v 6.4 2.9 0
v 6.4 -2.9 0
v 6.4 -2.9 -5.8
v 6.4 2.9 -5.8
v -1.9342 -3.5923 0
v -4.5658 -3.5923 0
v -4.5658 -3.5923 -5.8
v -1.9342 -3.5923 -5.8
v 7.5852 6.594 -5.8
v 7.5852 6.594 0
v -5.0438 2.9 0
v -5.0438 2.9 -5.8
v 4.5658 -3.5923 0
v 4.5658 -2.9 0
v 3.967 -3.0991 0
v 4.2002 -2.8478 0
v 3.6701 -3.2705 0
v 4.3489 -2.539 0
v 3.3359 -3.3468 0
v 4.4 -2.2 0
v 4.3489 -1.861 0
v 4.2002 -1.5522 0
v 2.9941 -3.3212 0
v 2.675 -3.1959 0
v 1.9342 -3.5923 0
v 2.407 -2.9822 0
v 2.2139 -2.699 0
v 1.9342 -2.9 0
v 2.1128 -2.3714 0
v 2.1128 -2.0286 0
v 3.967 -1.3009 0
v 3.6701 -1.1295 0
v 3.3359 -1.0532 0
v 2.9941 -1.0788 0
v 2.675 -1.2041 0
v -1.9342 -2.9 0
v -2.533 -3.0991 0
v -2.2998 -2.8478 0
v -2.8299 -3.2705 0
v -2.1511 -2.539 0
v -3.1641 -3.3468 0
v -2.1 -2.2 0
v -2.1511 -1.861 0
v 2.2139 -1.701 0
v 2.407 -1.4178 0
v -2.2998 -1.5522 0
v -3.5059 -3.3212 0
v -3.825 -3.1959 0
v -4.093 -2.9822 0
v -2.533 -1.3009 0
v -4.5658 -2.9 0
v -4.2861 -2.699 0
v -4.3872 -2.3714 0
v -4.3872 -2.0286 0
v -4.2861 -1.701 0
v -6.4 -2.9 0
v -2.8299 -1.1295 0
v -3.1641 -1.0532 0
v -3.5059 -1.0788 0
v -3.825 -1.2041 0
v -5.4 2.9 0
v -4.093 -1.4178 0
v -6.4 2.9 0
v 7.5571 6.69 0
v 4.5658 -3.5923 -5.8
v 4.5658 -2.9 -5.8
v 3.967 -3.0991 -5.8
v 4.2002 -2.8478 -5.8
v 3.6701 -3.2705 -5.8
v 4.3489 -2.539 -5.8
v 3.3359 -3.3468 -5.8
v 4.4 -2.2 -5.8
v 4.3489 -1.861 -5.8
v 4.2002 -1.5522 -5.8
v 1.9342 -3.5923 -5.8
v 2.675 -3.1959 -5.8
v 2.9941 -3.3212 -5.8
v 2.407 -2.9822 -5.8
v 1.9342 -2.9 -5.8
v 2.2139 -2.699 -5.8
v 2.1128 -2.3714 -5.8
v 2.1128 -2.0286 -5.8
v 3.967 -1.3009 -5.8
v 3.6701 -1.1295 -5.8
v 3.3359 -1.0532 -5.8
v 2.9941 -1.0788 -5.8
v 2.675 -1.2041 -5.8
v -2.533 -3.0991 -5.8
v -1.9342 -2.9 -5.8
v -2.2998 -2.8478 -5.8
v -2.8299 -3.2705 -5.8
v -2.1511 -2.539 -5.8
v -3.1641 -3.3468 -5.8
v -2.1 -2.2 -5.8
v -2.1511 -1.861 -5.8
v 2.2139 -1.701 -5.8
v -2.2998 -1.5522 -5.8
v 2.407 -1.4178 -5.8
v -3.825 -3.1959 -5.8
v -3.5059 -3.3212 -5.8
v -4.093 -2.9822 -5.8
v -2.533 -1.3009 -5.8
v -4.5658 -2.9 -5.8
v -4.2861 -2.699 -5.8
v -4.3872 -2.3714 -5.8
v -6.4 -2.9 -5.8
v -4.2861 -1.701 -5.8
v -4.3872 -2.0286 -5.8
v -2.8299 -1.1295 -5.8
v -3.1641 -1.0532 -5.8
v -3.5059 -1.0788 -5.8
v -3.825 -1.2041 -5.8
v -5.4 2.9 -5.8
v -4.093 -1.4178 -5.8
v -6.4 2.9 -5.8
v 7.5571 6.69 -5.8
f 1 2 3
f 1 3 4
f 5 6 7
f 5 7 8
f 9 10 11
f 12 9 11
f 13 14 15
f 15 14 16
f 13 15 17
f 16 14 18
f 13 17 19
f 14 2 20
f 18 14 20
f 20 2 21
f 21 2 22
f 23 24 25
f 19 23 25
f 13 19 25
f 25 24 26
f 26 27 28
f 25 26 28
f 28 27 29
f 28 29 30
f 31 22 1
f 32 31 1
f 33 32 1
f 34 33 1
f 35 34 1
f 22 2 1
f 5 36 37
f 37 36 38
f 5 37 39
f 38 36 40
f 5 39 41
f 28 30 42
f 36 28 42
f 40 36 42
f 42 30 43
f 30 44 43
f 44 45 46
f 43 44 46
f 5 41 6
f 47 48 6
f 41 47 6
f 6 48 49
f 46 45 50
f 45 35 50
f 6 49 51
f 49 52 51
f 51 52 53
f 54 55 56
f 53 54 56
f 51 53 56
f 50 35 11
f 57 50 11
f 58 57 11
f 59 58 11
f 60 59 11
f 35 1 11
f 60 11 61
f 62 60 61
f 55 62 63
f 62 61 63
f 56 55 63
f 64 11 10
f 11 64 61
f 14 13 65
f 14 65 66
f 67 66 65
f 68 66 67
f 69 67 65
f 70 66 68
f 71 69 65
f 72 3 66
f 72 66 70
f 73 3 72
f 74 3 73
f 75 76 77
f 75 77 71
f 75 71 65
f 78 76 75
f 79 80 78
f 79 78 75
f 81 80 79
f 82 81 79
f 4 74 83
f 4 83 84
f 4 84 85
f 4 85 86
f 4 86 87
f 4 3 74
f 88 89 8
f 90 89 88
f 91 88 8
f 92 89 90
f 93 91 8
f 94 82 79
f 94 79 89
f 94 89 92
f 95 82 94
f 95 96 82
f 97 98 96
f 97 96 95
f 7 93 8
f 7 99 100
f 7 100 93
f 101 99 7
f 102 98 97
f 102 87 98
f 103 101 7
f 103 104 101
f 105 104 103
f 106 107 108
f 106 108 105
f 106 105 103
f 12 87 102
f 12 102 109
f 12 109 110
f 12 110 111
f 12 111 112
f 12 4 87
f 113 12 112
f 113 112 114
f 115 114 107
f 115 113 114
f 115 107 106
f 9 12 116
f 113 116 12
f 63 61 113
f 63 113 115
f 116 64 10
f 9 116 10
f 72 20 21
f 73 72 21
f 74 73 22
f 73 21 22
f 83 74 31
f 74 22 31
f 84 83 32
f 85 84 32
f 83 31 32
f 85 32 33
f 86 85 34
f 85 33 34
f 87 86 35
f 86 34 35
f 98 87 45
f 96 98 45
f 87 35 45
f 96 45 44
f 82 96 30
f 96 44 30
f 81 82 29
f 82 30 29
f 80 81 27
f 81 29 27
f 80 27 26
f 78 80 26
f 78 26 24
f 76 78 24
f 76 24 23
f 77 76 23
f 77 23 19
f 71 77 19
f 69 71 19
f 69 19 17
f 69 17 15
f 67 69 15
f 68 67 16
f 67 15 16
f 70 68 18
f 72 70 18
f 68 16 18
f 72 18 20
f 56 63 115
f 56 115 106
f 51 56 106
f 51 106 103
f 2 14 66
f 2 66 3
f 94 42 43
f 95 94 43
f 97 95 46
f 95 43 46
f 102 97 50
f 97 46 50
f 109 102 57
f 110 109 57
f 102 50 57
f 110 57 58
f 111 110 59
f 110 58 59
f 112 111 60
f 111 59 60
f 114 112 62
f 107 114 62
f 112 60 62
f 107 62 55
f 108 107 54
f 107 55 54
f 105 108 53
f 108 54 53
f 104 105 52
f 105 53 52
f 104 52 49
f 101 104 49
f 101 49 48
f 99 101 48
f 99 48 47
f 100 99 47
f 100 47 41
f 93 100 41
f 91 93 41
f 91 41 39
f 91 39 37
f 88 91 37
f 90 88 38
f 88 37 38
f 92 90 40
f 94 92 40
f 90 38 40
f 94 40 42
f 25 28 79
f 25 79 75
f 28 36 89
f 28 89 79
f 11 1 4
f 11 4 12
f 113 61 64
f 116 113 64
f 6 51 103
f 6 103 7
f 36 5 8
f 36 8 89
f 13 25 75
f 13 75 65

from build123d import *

# Parameters (mm, degrees)
SKETCH1_R           = 1.15
BOSS_EXTRUDE1_DEPTH = 5.8
EXTRUDE_THIN1_DEPTH = 5.8


with BuildPart() as part:
    # Sketch1 → Boss-Extrude1 (new body)
    with BuildSketch(Plane.XY):
        Polygon((-6.4, -2.9), (-4.565838245, -2.9), (-4.565838245, -3.592341201), (-1.934161755, -3.592341201), (-1.934161755, -2.9), (1.934161755, -2.9), (1.934161755, -3.592341201), (4.565838245, -3.592341201), (4.565838245, -2.9), (6.4, -2.9), (6.4, 2.9), (-6.4, 2.9), align=None)
        with Locations((-3.25, -2.2)):
            Circle(SKETCH1_R, mode=Mode.SUBTRACT)
        with Locations((3.25, -2.2)):
            Circle(SKETCH1_R, mode=Mode.SUBTRACT)
    extrude(amount=-BOSS_EXTRUDE1_DEPTH)

    # Sketch2 → Extrude-Thin1 (add)
    with BuildSketch(Plane.XY):
        Polygon((-5.4, 2.9), (7.557079146, 6.69), (7.58515322, 6.594021636), (-5.371925926, 2.804021636), align=None)
    extrude(amount=-EXTRUDE_THIN1_DEPTH)


solid = part.part
